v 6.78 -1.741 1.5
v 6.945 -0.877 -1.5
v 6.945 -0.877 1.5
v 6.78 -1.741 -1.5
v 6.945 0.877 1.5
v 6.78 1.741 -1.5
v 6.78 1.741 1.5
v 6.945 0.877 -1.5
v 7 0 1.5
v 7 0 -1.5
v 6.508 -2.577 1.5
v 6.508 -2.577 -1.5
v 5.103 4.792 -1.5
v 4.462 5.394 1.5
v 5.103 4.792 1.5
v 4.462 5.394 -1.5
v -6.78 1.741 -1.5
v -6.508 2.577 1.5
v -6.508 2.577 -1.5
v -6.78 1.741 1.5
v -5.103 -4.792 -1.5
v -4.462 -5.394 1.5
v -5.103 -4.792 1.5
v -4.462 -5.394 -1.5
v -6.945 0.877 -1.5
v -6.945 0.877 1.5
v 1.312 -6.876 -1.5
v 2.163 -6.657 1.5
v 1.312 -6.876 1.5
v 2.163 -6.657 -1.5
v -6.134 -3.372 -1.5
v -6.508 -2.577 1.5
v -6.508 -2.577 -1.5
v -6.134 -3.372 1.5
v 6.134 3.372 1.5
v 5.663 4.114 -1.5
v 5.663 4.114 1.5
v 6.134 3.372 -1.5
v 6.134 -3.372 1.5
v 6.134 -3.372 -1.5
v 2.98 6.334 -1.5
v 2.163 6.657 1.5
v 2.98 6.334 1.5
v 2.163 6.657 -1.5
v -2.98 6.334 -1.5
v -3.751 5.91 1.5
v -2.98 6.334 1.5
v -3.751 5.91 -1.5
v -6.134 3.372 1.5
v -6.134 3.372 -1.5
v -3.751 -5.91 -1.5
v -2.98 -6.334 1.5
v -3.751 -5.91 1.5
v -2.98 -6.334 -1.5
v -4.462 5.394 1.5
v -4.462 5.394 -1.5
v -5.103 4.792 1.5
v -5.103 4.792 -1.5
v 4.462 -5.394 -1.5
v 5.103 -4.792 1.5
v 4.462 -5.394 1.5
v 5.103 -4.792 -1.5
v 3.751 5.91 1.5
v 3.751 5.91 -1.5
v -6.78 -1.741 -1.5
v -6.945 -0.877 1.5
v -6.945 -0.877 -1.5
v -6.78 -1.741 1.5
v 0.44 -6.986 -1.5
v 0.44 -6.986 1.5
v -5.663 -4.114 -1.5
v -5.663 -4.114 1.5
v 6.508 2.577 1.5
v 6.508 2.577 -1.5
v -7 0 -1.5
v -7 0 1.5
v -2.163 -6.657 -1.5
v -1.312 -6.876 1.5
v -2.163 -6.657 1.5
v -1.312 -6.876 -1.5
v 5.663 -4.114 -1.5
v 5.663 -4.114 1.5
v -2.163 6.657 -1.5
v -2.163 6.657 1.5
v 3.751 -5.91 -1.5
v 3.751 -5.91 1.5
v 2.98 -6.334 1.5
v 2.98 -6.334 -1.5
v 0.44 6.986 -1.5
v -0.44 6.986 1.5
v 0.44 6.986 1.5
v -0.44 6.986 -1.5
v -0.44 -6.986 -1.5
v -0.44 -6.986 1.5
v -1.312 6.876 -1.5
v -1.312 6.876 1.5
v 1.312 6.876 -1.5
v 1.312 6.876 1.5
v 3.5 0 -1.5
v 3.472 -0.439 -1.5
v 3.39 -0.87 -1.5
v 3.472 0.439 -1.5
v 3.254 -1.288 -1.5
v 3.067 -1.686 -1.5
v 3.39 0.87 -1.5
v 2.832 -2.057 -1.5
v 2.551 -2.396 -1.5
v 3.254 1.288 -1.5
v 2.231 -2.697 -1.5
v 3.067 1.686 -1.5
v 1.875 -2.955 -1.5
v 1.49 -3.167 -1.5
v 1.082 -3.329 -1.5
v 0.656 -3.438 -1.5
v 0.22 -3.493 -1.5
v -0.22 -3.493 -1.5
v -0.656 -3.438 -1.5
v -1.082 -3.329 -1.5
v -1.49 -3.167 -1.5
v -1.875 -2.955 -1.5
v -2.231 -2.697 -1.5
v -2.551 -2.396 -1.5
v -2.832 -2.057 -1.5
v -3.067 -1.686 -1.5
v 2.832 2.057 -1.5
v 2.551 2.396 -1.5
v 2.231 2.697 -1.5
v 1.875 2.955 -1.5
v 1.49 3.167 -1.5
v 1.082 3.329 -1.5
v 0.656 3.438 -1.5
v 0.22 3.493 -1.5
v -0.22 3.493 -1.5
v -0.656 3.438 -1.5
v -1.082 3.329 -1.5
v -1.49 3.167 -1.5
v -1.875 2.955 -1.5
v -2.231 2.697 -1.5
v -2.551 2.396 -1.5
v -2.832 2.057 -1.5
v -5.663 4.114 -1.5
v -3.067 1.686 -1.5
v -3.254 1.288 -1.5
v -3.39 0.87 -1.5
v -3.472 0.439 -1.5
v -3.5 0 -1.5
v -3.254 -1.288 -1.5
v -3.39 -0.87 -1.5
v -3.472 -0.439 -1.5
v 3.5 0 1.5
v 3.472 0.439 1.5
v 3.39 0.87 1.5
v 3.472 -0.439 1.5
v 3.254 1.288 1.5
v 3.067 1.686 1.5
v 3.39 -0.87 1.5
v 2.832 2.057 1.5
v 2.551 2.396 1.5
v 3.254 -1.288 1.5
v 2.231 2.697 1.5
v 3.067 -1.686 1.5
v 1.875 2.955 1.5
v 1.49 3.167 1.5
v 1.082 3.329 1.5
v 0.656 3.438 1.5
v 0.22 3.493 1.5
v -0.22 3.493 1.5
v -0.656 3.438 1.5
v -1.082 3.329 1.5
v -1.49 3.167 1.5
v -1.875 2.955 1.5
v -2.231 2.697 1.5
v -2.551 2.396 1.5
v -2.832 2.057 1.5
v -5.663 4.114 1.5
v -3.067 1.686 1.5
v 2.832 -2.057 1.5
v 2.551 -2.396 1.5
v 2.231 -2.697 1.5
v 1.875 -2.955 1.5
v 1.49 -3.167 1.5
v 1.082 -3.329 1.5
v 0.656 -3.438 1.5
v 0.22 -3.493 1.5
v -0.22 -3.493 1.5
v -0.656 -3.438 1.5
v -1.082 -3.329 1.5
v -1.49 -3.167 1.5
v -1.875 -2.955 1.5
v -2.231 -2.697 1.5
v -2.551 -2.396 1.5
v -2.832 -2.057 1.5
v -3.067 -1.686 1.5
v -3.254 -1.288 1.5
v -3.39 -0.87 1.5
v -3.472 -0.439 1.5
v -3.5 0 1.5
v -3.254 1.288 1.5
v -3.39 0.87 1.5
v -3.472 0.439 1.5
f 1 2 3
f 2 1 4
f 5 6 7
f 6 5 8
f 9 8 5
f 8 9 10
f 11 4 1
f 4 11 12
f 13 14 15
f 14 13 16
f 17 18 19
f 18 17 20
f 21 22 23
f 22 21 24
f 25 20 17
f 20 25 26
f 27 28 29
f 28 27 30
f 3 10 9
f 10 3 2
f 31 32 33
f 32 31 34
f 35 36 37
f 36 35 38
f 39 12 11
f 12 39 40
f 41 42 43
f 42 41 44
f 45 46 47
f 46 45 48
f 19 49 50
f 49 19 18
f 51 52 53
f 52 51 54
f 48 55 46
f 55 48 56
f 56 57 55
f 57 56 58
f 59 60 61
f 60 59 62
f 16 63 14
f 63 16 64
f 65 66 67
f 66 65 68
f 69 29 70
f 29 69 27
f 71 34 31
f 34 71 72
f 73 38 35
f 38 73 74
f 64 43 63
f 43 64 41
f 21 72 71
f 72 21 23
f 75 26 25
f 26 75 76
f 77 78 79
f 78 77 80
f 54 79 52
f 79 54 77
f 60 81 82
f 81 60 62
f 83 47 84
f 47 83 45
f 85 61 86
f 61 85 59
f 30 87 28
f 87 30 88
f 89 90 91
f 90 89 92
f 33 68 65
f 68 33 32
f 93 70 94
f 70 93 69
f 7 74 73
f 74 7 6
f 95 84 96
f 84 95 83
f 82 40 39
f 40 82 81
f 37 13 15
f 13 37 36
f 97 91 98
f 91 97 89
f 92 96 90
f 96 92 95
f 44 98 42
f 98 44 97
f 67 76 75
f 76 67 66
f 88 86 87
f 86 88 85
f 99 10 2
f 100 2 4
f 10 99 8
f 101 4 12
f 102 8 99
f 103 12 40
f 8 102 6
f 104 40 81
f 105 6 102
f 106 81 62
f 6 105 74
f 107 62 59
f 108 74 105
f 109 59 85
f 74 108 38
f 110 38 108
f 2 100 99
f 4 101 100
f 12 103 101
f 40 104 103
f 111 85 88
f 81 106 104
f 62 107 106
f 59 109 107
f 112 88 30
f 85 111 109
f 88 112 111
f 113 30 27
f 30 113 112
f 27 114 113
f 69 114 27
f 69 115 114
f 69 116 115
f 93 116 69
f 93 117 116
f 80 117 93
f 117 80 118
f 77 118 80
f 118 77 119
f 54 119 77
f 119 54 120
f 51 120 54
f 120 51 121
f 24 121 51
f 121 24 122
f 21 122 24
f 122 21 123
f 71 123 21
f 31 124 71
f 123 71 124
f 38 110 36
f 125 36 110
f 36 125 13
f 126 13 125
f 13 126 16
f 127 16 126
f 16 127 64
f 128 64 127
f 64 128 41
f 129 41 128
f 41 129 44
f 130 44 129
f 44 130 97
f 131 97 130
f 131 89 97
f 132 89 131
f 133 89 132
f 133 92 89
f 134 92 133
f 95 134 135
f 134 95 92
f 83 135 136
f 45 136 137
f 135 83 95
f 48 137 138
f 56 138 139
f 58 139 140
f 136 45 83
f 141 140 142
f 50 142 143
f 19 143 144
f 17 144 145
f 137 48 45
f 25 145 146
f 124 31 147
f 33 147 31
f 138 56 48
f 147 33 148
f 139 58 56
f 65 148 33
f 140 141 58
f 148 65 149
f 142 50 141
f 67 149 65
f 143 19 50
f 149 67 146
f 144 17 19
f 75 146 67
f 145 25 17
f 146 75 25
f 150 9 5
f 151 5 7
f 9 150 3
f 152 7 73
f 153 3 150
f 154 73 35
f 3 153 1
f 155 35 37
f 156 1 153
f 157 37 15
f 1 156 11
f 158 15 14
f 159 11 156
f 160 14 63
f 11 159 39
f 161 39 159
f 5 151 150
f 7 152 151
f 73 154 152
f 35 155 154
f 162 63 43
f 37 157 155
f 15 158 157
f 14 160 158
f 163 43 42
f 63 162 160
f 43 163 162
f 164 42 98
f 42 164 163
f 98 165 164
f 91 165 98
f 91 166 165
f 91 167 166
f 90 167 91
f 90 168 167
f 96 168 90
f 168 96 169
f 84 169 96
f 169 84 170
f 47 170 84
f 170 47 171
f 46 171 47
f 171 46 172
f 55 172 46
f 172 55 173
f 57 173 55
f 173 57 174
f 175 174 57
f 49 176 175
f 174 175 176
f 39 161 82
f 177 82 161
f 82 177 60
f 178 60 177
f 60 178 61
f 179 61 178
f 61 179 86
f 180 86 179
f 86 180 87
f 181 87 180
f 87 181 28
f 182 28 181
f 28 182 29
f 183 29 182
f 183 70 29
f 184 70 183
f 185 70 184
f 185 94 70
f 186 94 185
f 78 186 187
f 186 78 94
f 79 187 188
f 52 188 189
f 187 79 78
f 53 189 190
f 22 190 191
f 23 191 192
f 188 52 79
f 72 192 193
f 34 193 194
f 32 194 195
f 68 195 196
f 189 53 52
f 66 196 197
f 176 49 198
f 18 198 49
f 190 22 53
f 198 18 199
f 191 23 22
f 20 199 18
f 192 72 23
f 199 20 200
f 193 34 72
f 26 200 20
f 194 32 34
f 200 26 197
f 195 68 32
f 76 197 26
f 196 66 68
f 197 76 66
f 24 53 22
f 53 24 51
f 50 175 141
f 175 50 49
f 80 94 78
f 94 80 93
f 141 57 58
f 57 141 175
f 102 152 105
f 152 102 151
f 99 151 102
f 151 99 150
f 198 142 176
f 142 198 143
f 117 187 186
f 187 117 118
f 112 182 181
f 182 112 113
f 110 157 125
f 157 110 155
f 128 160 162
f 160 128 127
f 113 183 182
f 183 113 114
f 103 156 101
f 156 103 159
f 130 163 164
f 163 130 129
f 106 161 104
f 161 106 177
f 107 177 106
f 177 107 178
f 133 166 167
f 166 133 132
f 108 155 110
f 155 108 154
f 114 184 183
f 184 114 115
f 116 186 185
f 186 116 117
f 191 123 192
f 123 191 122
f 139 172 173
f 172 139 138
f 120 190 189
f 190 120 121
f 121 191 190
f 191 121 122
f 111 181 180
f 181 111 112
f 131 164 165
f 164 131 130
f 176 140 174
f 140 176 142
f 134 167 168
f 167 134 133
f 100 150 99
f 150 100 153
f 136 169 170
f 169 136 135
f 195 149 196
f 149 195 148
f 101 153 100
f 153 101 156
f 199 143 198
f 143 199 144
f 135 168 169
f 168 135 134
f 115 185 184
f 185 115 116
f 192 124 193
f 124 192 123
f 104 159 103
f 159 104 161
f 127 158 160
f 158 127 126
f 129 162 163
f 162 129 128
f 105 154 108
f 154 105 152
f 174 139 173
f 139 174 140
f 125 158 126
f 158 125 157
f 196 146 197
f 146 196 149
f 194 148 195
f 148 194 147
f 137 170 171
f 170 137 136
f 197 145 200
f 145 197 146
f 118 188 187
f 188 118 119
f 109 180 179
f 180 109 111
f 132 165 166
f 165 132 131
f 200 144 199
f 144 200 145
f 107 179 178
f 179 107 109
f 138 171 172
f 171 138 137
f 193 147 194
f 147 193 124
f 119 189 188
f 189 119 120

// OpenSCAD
$fn = 50;


difference() {
	union() {
		translate(v = [0, 0, -1.5000000000]) {
			cylinder(h = 3, r = 7.0000000000);
		}
	}
	union() {
		translate(v = [0, 0, -100.0000000000]) {
			cylinder(h = 200, r = 3.5000000000);
		}
	}
}
